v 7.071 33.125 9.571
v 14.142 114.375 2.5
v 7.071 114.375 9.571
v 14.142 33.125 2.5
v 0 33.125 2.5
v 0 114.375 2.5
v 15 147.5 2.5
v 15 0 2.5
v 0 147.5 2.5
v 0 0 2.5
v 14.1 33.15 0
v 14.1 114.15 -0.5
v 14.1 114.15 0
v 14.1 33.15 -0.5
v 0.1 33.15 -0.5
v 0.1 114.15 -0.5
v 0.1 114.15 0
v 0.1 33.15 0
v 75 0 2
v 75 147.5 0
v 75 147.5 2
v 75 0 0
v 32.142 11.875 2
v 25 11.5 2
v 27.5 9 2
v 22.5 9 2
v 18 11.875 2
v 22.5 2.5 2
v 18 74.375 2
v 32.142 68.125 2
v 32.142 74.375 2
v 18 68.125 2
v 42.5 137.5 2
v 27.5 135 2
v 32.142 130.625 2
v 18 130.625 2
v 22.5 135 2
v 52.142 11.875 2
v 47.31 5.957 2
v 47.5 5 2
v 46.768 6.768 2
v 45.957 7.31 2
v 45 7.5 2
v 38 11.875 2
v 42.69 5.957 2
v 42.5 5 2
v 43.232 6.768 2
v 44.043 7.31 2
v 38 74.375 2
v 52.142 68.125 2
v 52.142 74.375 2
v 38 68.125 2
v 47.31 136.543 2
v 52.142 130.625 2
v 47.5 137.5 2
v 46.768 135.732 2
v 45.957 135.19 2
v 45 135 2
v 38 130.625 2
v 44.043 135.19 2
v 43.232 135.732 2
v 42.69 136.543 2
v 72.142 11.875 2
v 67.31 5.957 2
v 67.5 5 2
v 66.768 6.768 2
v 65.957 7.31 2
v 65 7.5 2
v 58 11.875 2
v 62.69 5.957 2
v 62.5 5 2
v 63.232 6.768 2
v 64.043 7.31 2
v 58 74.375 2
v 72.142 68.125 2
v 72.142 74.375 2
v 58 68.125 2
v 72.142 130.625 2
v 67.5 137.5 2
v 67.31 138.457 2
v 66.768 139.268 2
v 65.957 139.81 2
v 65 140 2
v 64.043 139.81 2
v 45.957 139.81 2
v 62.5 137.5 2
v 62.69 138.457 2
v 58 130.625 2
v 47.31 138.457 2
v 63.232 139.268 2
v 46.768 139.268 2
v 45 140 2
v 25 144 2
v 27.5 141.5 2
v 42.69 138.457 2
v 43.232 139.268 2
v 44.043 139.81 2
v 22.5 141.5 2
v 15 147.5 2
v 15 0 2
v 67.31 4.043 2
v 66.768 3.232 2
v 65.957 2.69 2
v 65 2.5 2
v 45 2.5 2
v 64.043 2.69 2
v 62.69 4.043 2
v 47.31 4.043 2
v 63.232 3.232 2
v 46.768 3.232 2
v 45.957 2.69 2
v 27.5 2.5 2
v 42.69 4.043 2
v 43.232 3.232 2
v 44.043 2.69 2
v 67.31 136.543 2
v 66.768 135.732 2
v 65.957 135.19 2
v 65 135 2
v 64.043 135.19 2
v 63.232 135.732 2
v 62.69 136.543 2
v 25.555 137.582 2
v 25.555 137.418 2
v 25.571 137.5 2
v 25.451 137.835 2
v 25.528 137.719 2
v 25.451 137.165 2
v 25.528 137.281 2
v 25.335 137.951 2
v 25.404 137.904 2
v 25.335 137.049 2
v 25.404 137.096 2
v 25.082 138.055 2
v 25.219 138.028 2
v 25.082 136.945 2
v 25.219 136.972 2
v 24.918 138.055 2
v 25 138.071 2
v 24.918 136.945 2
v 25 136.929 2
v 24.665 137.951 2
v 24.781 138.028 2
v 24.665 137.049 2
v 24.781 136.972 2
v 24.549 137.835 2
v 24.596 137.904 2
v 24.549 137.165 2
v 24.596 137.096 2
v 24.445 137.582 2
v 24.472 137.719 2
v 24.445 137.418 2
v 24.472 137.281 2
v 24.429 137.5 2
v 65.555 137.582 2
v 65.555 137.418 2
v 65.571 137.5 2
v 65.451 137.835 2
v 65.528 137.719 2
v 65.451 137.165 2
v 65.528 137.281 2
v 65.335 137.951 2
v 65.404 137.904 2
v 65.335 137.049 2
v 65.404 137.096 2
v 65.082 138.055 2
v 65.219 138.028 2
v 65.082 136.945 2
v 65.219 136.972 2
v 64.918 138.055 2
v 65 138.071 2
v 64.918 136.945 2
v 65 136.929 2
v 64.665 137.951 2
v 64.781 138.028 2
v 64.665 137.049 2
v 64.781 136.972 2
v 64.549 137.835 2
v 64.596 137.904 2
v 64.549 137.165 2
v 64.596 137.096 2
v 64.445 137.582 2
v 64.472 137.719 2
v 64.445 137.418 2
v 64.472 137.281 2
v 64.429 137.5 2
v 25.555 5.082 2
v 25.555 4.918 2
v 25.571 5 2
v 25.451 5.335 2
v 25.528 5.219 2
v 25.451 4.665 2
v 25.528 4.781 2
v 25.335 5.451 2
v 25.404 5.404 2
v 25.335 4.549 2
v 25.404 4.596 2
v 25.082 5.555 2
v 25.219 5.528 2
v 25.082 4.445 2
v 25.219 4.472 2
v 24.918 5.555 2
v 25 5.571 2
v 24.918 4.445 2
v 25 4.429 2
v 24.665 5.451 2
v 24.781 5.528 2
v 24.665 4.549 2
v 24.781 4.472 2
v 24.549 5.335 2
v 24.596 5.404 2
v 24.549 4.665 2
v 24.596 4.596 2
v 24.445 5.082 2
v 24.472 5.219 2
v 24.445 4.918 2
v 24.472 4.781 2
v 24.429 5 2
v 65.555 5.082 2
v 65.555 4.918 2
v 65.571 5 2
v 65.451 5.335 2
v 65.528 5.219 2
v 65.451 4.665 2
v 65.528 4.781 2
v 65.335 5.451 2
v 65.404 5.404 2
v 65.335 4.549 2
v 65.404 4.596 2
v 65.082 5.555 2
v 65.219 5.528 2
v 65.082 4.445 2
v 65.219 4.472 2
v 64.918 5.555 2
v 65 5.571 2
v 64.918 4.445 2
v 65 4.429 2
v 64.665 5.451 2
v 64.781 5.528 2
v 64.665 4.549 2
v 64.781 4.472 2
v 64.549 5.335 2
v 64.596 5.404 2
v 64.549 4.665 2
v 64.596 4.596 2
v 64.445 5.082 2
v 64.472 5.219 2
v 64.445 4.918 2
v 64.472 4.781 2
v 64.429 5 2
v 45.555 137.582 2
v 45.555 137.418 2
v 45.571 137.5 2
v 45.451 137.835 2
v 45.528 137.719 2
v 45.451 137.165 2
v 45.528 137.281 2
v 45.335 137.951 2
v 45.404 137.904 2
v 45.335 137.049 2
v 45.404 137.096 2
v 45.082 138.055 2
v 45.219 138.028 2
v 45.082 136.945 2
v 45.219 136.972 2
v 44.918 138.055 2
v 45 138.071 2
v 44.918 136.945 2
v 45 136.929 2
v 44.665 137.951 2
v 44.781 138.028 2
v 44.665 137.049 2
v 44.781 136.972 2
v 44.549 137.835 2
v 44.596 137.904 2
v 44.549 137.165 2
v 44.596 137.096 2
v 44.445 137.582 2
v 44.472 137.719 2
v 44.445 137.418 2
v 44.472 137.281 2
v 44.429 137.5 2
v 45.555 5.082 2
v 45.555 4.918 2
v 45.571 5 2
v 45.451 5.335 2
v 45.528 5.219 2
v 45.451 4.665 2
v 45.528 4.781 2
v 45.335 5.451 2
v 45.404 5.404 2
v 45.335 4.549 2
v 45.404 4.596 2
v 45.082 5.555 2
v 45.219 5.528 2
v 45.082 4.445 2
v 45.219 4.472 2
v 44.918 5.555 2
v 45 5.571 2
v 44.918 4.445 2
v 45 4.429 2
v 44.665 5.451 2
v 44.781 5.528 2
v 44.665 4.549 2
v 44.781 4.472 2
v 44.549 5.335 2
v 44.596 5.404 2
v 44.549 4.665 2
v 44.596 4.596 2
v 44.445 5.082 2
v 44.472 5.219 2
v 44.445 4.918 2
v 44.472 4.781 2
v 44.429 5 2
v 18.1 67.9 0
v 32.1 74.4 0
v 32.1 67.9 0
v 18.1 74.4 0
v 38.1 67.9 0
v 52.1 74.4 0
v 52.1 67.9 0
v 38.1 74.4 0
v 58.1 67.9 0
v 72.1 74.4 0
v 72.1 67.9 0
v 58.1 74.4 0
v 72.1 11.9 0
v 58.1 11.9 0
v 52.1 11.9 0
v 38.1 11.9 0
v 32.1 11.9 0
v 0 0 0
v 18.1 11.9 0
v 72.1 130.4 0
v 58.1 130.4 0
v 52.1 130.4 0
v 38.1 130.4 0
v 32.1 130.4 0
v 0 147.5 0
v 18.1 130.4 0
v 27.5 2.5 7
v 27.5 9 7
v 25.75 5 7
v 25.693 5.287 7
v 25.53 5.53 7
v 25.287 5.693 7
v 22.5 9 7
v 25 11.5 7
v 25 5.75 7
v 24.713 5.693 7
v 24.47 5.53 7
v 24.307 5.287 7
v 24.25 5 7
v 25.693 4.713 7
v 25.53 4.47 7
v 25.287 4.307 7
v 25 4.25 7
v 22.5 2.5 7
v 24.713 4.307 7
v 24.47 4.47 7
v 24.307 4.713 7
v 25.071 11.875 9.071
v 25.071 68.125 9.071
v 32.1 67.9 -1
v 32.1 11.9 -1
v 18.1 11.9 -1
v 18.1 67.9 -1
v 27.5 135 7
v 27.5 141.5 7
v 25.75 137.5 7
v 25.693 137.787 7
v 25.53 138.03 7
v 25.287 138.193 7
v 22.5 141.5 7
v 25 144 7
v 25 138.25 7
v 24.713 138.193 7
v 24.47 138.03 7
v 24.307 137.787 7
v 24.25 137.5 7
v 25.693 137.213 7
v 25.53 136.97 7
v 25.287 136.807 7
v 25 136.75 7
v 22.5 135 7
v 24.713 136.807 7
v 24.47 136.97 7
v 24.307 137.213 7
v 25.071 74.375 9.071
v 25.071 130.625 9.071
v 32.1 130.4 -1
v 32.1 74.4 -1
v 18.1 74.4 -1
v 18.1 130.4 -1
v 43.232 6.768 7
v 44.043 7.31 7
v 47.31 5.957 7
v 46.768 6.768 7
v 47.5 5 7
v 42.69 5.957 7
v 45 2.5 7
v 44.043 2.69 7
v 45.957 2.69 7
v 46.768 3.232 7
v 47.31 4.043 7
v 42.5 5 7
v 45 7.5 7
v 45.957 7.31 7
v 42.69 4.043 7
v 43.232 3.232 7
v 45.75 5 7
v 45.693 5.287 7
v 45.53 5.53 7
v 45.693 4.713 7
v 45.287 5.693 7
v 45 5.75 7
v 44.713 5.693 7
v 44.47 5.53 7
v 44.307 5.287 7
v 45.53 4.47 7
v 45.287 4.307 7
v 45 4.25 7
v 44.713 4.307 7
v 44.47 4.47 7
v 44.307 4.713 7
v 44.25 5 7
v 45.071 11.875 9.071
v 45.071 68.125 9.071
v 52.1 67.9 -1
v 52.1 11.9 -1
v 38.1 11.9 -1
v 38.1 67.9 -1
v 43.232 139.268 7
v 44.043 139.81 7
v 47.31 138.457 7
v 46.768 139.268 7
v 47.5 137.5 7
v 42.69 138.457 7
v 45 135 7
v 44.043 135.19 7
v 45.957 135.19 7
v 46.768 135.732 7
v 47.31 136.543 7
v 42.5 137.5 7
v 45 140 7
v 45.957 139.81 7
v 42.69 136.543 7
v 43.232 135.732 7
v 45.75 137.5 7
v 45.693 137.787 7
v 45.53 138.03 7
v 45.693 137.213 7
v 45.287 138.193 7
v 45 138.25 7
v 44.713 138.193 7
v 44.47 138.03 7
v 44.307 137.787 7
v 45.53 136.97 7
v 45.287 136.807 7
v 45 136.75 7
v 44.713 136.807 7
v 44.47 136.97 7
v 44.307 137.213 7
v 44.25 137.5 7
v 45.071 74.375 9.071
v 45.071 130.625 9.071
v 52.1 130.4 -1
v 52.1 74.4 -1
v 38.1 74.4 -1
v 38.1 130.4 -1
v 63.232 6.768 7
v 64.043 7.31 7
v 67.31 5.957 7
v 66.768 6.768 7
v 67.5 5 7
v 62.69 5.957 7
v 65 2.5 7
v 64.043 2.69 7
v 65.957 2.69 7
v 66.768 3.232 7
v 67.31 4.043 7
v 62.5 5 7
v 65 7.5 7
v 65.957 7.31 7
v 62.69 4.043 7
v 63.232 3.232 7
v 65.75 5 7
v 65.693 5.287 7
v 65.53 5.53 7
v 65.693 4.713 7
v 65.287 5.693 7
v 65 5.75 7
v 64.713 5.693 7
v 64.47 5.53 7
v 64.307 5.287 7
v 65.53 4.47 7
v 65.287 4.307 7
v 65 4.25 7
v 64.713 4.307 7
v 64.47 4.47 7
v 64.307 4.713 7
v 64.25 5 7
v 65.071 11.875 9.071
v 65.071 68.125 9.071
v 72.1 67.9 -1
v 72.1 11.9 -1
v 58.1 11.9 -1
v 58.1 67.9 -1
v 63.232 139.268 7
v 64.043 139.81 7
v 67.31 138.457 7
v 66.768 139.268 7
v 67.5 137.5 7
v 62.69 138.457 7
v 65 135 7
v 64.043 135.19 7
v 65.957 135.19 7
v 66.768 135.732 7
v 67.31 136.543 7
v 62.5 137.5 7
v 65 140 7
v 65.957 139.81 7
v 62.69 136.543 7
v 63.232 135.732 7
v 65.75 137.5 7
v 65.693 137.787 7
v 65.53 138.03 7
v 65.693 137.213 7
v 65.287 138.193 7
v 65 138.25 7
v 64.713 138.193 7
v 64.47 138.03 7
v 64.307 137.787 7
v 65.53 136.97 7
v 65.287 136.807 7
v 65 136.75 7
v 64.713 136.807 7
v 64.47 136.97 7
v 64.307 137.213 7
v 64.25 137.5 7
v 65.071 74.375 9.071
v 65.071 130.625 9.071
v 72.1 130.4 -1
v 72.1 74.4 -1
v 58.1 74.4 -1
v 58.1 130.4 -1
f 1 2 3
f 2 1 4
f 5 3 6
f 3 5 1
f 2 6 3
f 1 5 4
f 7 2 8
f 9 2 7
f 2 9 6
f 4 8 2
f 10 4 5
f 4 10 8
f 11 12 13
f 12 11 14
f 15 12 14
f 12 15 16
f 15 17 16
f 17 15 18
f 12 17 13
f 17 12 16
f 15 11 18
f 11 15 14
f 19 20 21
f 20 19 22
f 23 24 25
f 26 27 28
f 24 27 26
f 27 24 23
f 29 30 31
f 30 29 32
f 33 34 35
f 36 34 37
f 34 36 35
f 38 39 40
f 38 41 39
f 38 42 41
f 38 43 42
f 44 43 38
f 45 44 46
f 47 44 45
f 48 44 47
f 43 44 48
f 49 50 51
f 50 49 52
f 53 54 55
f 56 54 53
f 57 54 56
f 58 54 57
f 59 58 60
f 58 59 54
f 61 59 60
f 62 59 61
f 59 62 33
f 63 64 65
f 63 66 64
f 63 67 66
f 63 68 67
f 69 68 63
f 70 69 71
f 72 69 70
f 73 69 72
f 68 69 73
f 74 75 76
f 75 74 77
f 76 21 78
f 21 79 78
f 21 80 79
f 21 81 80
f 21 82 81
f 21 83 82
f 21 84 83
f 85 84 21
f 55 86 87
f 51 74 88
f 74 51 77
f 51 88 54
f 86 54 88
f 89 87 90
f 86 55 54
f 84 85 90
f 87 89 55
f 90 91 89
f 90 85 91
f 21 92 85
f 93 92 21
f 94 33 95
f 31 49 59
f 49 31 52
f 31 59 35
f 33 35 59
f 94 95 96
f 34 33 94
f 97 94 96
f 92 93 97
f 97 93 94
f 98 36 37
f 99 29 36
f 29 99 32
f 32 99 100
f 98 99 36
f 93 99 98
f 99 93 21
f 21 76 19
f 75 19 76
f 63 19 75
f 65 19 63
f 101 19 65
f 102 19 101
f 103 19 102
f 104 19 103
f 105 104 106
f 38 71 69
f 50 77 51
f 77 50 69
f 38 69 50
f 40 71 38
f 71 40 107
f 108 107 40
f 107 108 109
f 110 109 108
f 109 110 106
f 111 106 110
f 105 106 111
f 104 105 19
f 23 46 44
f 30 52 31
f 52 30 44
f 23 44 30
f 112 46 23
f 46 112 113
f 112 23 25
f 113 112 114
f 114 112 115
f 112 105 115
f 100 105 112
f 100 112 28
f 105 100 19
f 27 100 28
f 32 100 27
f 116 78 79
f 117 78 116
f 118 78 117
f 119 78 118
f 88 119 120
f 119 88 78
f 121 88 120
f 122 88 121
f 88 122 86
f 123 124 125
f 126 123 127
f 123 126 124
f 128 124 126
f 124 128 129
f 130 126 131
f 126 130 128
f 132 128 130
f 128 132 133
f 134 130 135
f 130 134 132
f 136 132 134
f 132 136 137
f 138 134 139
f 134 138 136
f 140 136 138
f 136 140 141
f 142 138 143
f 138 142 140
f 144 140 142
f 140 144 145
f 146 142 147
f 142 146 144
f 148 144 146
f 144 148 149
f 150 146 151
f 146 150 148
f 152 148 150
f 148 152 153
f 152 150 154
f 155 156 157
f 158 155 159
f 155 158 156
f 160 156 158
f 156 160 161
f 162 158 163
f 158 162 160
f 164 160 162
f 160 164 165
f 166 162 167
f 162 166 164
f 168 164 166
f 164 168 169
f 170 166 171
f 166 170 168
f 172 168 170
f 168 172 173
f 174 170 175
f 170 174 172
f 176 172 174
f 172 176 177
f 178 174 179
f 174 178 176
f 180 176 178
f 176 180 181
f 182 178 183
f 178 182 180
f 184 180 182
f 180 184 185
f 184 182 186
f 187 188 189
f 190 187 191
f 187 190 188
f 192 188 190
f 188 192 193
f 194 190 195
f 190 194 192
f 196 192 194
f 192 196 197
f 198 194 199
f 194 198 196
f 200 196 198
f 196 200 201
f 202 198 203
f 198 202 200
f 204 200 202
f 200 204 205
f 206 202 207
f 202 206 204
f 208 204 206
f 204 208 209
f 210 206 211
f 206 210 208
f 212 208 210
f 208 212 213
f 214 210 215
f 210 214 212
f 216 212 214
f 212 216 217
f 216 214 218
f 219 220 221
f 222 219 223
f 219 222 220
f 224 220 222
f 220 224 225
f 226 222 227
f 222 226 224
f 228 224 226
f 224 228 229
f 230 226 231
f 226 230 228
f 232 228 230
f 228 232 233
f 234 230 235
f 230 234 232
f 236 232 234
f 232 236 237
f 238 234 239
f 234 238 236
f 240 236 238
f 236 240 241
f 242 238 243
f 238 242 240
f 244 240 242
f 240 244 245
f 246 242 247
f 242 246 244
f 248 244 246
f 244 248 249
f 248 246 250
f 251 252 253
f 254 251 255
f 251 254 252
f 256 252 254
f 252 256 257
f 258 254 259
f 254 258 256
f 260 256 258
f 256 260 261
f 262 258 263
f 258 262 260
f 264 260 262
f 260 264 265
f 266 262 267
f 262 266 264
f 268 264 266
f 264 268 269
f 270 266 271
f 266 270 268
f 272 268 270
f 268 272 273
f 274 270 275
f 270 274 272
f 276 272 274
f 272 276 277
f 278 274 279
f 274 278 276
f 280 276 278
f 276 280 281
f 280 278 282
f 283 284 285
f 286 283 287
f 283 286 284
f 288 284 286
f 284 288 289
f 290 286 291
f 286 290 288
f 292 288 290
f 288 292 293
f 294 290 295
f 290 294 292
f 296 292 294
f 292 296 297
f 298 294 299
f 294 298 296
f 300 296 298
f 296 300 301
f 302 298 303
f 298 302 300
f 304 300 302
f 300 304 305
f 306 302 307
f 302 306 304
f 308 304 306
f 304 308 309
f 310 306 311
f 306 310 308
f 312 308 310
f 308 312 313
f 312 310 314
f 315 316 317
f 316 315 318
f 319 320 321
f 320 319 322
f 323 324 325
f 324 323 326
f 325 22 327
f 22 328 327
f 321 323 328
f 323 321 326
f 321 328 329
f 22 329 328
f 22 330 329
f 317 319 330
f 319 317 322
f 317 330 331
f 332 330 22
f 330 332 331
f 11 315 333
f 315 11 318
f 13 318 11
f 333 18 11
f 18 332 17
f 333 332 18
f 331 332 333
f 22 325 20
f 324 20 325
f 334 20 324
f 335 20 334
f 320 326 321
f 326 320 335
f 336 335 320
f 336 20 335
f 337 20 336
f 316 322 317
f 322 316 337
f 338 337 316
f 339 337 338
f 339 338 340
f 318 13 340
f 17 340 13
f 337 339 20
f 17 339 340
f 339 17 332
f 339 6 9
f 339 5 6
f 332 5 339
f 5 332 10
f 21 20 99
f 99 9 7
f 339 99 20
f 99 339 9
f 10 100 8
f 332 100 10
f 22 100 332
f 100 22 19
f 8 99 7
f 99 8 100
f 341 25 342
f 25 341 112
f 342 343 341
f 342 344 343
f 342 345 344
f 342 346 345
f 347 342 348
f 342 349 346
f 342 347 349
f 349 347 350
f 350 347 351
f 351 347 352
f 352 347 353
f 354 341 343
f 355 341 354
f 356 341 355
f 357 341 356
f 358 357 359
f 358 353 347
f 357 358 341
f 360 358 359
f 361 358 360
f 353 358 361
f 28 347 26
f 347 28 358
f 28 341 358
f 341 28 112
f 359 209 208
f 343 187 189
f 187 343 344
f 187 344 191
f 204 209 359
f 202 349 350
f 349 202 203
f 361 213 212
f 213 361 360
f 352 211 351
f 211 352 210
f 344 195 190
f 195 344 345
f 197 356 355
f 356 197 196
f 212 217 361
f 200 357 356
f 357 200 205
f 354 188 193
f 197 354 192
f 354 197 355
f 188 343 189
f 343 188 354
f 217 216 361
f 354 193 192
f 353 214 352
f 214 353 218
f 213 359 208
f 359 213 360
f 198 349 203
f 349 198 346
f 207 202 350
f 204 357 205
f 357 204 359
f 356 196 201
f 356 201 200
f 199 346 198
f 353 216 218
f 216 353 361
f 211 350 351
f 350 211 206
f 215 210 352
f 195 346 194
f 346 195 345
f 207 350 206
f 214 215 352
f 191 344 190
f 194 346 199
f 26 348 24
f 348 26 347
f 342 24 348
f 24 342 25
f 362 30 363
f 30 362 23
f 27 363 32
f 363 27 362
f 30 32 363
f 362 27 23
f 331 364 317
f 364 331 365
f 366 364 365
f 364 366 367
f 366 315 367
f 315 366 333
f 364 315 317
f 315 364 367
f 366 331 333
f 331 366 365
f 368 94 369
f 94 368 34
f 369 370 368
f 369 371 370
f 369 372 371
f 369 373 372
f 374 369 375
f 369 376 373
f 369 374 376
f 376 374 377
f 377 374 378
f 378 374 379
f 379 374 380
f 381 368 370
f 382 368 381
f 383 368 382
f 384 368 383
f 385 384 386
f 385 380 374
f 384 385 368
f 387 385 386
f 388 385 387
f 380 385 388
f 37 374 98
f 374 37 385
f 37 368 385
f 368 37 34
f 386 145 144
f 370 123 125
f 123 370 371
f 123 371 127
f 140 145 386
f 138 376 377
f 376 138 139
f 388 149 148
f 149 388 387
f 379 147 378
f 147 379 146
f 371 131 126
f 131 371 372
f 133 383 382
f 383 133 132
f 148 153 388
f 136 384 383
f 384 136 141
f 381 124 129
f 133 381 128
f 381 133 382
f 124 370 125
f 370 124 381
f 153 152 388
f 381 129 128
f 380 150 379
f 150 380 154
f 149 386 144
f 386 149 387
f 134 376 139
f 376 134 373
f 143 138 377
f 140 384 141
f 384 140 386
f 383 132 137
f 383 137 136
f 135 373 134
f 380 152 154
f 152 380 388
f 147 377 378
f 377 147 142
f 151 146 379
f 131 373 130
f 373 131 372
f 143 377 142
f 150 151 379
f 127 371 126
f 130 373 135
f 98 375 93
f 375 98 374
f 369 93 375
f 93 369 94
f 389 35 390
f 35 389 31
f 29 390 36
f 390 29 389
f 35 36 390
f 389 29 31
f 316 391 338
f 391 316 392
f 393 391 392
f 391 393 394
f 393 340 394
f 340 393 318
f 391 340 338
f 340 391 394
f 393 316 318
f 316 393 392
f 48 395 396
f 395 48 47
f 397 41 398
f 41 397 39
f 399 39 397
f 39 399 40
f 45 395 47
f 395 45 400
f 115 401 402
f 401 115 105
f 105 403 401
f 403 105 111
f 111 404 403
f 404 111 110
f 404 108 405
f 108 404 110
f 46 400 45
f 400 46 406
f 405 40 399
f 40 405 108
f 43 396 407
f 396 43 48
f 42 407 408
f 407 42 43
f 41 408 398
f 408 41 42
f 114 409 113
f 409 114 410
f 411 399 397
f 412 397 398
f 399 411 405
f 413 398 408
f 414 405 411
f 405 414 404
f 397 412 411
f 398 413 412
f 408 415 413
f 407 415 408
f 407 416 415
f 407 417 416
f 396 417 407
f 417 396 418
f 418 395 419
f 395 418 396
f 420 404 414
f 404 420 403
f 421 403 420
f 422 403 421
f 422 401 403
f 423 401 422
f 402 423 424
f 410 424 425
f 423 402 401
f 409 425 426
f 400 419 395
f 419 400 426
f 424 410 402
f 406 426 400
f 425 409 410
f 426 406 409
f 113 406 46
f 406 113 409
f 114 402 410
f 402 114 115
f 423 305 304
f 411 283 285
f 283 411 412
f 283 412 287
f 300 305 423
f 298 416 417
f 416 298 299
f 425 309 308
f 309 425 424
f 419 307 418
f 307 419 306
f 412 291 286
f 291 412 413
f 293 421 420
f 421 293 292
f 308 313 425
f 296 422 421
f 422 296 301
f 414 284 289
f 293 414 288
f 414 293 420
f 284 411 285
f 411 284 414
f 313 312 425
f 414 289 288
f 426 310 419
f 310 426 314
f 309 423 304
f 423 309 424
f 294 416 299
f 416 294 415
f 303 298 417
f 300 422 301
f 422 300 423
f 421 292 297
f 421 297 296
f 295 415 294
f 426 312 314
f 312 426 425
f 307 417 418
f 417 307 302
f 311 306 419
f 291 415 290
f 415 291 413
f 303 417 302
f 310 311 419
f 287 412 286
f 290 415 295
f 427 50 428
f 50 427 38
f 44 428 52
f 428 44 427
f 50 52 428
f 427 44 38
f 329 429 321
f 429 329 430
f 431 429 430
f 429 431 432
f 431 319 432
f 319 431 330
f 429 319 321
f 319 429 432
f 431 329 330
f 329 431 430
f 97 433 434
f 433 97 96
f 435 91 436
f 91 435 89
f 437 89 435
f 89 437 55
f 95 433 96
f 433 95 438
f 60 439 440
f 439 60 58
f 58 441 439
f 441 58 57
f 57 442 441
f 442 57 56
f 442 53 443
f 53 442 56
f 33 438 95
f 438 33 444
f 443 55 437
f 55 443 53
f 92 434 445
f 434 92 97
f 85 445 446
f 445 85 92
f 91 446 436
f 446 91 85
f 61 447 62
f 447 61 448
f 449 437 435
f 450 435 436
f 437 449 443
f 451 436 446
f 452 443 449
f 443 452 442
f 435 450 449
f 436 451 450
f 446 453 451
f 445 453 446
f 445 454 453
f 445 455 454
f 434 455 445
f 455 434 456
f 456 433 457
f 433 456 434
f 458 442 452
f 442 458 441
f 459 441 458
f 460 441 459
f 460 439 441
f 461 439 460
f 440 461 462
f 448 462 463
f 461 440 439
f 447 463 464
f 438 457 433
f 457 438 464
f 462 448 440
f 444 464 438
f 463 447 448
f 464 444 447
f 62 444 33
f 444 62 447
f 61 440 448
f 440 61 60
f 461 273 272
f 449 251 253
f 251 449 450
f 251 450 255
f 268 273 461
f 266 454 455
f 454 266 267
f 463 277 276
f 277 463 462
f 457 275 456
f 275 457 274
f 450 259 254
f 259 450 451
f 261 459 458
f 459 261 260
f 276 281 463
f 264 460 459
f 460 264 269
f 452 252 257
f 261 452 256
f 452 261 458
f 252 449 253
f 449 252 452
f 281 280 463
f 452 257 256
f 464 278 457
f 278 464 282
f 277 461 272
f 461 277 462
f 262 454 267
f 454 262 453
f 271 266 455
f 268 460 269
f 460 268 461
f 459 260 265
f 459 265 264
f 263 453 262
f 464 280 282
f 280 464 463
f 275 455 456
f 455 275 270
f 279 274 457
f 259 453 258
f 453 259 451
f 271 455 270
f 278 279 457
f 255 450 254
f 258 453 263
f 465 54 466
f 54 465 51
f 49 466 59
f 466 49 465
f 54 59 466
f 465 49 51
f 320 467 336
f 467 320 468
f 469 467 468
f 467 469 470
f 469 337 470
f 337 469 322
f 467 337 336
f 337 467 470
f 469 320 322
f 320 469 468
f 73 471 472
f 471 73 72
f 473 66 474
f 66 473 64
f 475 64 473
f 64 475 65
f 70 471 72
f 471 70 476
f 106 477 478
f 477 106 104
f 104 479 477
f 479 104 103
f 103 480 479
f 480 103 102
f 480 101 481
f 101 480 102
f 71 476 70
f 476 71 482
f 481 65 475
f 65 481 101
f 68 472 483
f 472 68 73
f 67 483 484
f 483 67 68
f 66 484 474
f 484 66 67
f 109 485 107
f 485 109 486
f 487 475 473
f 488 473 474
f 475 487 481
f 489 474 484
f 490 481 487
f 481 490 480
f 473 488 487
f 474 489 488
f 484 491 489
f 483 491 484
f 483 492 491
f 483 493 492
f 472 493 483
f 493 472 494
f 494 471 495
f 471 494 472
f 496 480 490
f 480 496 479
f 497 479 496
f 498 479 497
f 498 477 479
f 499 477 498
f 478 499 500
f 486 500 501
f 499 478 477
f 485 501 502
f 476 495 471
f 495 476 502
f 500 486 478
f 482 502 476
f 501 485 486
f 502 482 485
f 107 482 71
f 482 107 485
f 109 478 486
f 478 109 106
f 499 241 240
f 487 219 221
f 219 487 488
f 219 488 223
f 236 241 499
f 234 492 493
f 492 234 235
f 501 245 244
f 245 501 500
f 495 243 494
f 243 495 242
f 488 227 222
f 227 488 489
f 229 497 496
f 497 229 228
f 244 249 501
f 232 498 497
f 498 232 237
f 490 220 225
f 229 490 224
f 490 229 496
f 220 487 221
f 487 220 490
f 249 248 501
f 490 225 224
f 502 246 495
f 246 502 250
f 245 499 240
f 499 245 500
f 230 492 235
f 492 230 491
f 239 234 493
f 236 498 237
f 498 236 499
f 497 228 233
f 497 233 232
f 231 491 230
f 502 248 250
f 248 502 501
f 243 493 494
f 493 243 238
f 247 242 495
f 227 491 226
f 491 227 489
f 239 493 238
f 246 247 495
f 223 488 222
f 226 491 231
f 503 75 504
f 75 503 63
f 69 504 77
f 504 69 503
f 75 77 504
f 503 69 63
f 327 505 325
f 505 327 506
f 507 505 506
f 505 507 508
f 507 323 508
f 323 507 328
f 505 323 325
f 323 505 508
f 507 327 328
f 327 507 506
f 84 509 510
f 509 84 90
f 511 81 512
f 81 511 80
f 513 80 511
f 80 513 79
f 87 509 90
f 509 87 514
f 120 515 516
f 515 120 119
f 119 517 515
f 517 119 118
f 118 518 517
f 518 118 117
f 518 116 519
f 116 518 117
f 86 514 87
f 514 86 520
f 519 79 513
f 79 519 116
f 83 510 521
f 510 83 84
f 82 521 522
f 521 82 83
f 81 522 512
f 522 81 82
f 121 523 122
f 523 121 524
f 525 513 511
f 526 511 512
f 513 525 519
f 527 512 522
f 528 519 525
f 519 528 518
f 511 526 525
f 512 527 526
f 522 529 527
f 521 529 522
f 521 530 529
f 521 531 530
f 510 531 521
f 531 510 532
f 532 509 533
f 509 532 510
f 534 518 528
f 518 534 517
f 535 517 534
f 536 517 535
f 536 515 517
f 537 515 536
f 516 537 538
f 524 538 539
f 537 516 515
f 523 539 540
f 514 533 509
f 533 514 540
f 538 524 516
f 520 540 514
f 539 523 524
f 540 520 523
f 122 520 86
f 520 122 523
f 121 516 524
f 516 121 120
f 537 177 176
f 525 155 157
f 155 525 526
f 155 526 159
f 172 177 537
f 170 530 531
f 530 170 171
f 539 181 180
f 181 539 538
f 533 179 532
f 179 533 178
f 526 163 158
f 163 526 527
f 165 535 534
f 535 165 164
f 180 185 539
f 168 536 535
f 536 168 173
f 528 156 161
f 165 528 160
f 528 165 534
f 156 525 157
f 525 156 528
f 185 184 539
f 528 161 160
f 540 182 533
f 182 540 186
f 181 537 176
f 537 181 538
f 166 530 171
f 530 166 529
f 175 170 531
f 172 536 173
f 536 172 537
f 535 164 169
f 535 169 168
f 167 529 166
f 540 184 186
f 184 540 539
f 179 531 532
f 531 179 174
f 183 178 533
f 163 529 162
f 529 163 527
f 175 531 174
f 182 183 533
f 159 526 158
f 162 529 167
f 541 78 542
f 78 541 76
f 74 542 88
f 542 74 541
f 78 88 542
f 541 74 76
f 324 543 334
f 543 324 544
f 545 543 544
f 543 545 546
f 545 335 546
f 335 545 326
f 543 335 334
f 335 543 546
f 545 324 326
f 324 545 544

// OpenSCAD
// file: ../OpenSCAD/Pin.scad
// Height of pins
pinHeight = 7;      // was 7
// ----------------------------------------------------- //
// Draw a cylinder and drill a hole in it                //
// ----------------------------------------------------- //
module pin(px, py, pz) {
    translate([px, py, pz]) {
        difference() {
            cylinder(h=pinHeight, r=2.5, $fn=16);
            translate([2, 2, 1]);
                cylinder(h=pinHeight, r1=0.5, r2=0.75, $fn=16);
        }
    }   
}

// pin(0, 0, 0);
// file: ../OpenSCAD/brailleAndText.scad
/*
Braille Module
http://creativecommons.org/licenses/by/3.0/
*/


// mm sizes from http://dots.physics.orst.edu/gs_layout.html
radius = 0.25;
spacing = 2.5;
startOffset = 3.75;
distance = startOffset + spacing;

plate_height = 10;
plate_thickness = 10;   // was 2.

$fn = 10;



module letter(bitmap, char) {
//    echo(char);
	row_size = 2;
	col_size = 3;
	bitmap_size = row_size * col_size;
	
	function loc_x(loc) = floor(loc / row_size) * spacing + spacing;
	function loc_y(loc) = loc % row_size * spacing  + (distance-spacing)/2;

    translate([0, loc_y(-1), -2]) {
        rotate([270, 0, 90]) {
            linear_extrude(height = 1.25)
            text(char, 6);
        }
    }
	
    for (loc = [0:bitmap_size - 1]) {
		if (bitmap[loc] != 0) {
			union() {
				translate(v = [loc_x(loc), loc_y(loc), 0]) {
					sphere(radius = radius* bitmap[loc], center = true);
				}
			}
		}
	}
}


module braille_char(char) {
	if (char == "A" || char == "a") {
		letter([
			1,0,
			0,0,
			0,0
		], char);
	} else if (char == "B" || char == "b") {
		letter([
			1,0,
			1,0,
			0,0
		], char);
	} else if (char == "C" || char == "c") {
		letter([
			1,1,
			0,0,
			0,0
		], char);
	} else if (char == "D" || char == "d") {
		letter([
			1,1,
			0,1,
			0,0
		], char);
	} else if (char == "E" || char == "e") {
		letter([
			1,0,
			0,1,
			0,0
		], char);
	} else if (char == "F" || char == "f") {
		letter([
			1,1,
			1,0,
			0,0
		], char);
	} else if (char == "G" || char == "g") {
		letter([
			1,1,
			1,1,
			0,0
		], char);
	} else if (char == "H" || char == "h") {
		letter([
			1,0,
			1,1,
			0,0
		], char);
	} else if (char == "I" || char == "i") {
		letter([
			0,1,
			1,0,
			0,0
		], char);
	} else if (char == "J" || char == "j") {
		letter([
			0,1,
			1,1,
			0,0
		], char);
	} else if (char == "K" || char == "k") {
		letter([
			1,0,
			0,0,
			1,0
		], char);
	} else if (char == "L" || char == "l") {
		letter([
			1,0,
			1,0,
			1,0
		], char);
	} else if (char == "M" || char == "m") {
		letter([
			1,1,
			0,0,
			1,0
		], char);
	} else if (char == "N" || char == "n") {
		letter([
			1,1,
			0,1,
			1,0
		], char);
	} else if (char == "O" || char == "o") {
		letter([
			1,0,
			0,1,
			1,0
		], char);
	} else if (char == "P" || char == "p") {
		letter([
			1,1,
			1,0,
			1,0
		], char);
	} else if (char == "Q" || char == "q") {
		letter([
			1,1,
			1,1,
			1,0
		], char);
	} else if (char == "R" || char == "r") {
		letter([
			1,0,
			1,1,
			1,0
		], char);
	} else if (char == "S" || char == "s") {
		letter([
			0,1,
			1,0,
			1,0
		], char);
	} else if (char == "T" || char == "t") {
		letter([
			0,1,
			1,1,
			1,0
		], char);
	} else if (char == "U" || char == "u") {
		letter([
			1,0,
			0,0,
			1,1
		], char);
	} else if (char == "V" || char == "v") {
		letter([
			1,0,
			1,1,
			1,0
		], char);
	} else if (char == "W" || char == "w") {
		letter([
			0,1,
			1,1,
			0,1
		], char);
	} else if (char == "X" || char == "x") {
		letter([
			1,1,
			0,0,
			1,1
		], char);
	} else if (char == "Y" || char == "y") {
		letter([
			1,1,
			0,1,
			1,1
		], char);
	} else if (char == "Z" || char == "z") {
		letter([
			1,0,
			0,1,
			1,1
		], char);
    } else if (char == " ") {
		letter([
			0,0,
			0,0,
			0,0
		], char);
	} else {
		echo("Invalid Character: ", char);
	}

}

module braille_str(chars) {
    char_count = len(chars);
	echo(str("Total Width of ", chars, " : ",  distance * char_count, "mm"));
	union() {
		for (count = [0:char_count-1]) {
			translate(v = [0, count * distance, plate_thickness]) {
				braille_char(chars[count]);
			}
		}
		translate(v = [0, -distance/2, 0]) {
			color([0,0,1]) {
				cube(size = [plate_height, distance * (char_count+1), plate_thickness]);
			}
            }                                                      
	}
}

function lenText(txt="Hi") = distance * len(txt);

module printTextAndBraille(textToPrint) {
    blockLen = lenText(textToPrint);
    union()
    {
        difference() {                      // remove second box from first
            rotate([0,45,0]) {              // make it on its edge
                braille_str((textToPrint)); // make a long box
            }
            translate([0, -3.25, -8]) {     // move in right place
                cube(size = [14, (blockLen+8), 8]);
            }
        } 
        translate([0.1, -3.1, -3]) {     // move in right place
            cube(size = [14, (blockLen+6), 3]); 
        }
    }                                 
}

printTextAndBraille("HELLO CalLUM");
// file: ../OpenSCAD/BPNode.scad
use <brailleAndText.scad>;
use <Pin.scad>;

// These are to be overridden in the generated file
// ... they are used to calculate size of base.
numLines = 1;  // was 5
longestLine = "abcdefghijk";

// Thickness of base
bedHeight = 2;      // was 4
// Thickness of top section
reliefHeight = 2.5;   // was 6
// Height of pins
pinHeight = 7;      // was 7

// size of base
baseWidth = 35 + len(longestLine) * 6.25;   // was 40
//baseWidth = 100;
baseDepth = (numLines - 1) * 20 + 15;
// depth of top section
reliefDepth = 15;

// Offsets for each line
line1 = 7;
line2 = line1 + 18;
line3 = line2 + 20;
line4 = line3 + 20;
line5 = line4 + 20;
line6 = line5 + 20;
line7 = line6 + 20;
line8 = line7 + 20;

// offset for items on the left and right
left = 5;
right = baseWidth - 10;


// ----------------------------------------------------- //
// Draw base, add raised area for title and add title    //
// ----------------------------------------------------- //
module drawBase(title) { 
    cube([baseDepth,baseWidth,bedHeight]);      // Base
    cube([reliefDepth,baseWidth,reliefHeight]); // Top
    translate([0, (baseWidth/2 - lenText(title)/2), reliefHeight])
        printTextAndBraille(title);             // Title
}

// -------------------------------------------------------------- //
// Draw cube and drill a hole in it,                              //
// - then add a cylinder made with four segments (i.e. a diamond) //
// -------------------------------------------------------------- //
module executePin(px, py) {
    translate([px, py, 0]) {
        difference() {
            translate([-2.5, -2.5, 0])
            cube([5, 6.5, pinHeight]);
            translate([2, 2, 1]);
            cylinder(h=pinHeight, r1=0.5, r2=0.75, $fn=16);
        }
        translate([0, 4, 0])
        cylinder(h=pinHeight, r=2.5, $fn=4);
    } 
}

module executePinLeft(line) {
   executePin(line2, left);
} 

module executePinRight(line) {
   executePin(line2, right);
} 

module executePinLeftWithText(px, text) {
    executePin(px, left);
    printText(px, left, text);    
}

module executePinRightWithText(px, text) {
    y = lenText(text) + 20 ;  
    executePin(px, right);
    printText(px, right - y, text);    
}


// ----------------------------------------------------- //
// Call module from 'brailleAndText' library to draw     //
// ... text and braille                                  //
// ----------------------------------------------------- //
module printText(px, py, textValue) {
    translate([px - 7, py + 10, bedHeight]) {
        printTextAndBraille(textValue);
    }
}

// ----------------------------------------------------- //
// Call modules to draw pin and text on the left         //
// ----------------------------------------------------- //
module leftPin(line, text) {   
    pin(line, left, 0);
    printText(line, left, text);
}

// ----------------------------------------------------- //
// Call modules to draw pin and text on the right        //
// ----------------------------------------------------- //
module rightPin(line, text) {
    y = lenText(text) + 20 ;  
    pin(line, right, 0);
    printText(line, right - y, text);
}


// ------------------------------------------------------------- //
// ------------------------------------------------------------- //
//                        T O    U S E  ;                        //
// 1. Create file and add the following line at the top;         //
// include <BPNode.scad>;                                        //
// 2. Change value of numLines and longestLine, as appropritate. //
// 3. Add any of the other commands below, as appropriate.       //
// ------------------------------------------------------------- //
// ------------------------------------------------------------- //


/*
// include <BPNode.scad>; 
numLines = 5;
longestLine = "abcdefghijk";

drawBase("Print");

executePinLeft(line2);
//executePinLeftWithText(line2, "TestA");
executePinRight(line2);
//executePinRightWithText(line2, "TestB");

leftPin(line3, "String");
leftPin(line4, "Text"); 
leftPin(line5, "Log"); 

rightPin(line3, "Out");
*/
// main file
include <../OpenSCAD/BPNode.scad>;

numLines = 4;
longestLine = "                  ";

drawBase("            ");

executePinLeftWithText(line2,"        ");
executePinRightWithText(line2, "        ");

leftPin(line3, "        ");
rightPin(line3, "        ");

leftPin(line4, "        ");
rightPin(line4, "        ");
